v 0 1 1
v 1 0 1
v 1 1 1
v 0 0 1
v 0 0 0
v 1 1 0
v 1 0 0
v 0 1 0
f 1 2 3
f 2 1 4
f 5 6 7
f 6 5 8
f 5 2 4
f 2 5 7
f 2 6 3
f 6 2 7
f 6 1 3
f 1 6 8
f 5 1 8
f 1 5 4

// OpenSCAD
// Echoes the r5 paint-relevant dimensions so paint.py never hardcodes a number that common.scad
// already owns.  Driven by cad/tools/paint.py; runnable on its own for a quick look:
//   openscad -o /tmp/y.csg cad/tools/paint_probe.scad
include <../common.scad>

echo(P_W = R5_W);
echo(P_L = R5_L);
// the deck's plate is larger than the cassette (HOST_TOP / R5_DECK_* in common.scad): its own
// outline, centred on the cassette, in the cassette frame (so x0/y0 are negative)
echo(P_DECK_W = R5_DECK_W);
echo(P_DECK_L = R5_DECK_L);
echo(P_DECK_X0 = R5_DECK_X0);
echo(P_DECK_Y0 = R5_DECK_Y0);
echo(P_DECK_R = R5_DECK_R);
echo(P_DECK_T = R5_DECK_T);

echo(P_KB_X0 = R5_KB_X0);
echo(P_KB_Y0 = R5_KB_Y0);
echo(P_KB_W = R5_KB_POCKET[0]);
echo(P_KB_H = R5_KB_POCKET[1]);
echo(P_KB_R = R5_KB_CORNER + R5_KB_CLR);

echo(P_OLED_X0 = R5_OLED_WIN_X0);
echo(P_OLED_Y0 = R5_OLED_WIN_Y0);
echo(P_OLED_W = R5_OLED_WIN[0]);
echo(P_OLED_H = R5_OLED_WIN[1]);

echo(P_OPEN_X0 = R5_OPEN_X0);
echo(P_OPEN_X1 = R5_OPEN_X1);
echo(P_OPEN_D = R5_OPEN_D);

echo(P_FAN_X = DECK_FAN_CTRL[0][0]);
echo(P_FAN_Y = DECK_FAN_CTRL[0][1]);
echo(P_FAN_D = DECK_FAN_D);
echo(P_FAN_BARS = DECK_GRILL_BARS);
echo(P_FAN_BAR = DECK_GRILL_BAR);

echo(P_COVER_W = COVER_W);
echo(P_COVER_L = COVER_L);
echo(P_COVER_R = COVER_R);
echo(P_COVER_T = COVER_T);
echo(P_C_FRONT_Z = COVER_FRONT_Z);
echo(P_C_FRAME = COVER_FRAME);
echo(P_C_GAP = COVER_GAP);
echo(P_PANEL_X = PANEL_X);
echo(P_PANEL_Y = PANEL_Y);
echo(P_DISP_W = R5_PANEL[0]);
echo(P_DISP_H = R5_PANEL[1]);
echo(P_DISP_R = R5_PANEL[2]);
echo(P_ACTIVE_W = R5_PANEL_ACTIVE[0]);
echo(P_ACTIVE_H = R5_PANEL_ACTIVE[1]);
// the button is on the deck now, so it is a deck feature, not a cover one
echo(P_BTN_X = R5_BTN_X);
echo(P_BTN_Y = R5_BTN_Y);
echo(P_BTN_D = R5_BTN_D);
echo(P_BTN_BODY = R5_BTN_BODY);
// the 12 mm OLED button is a through-hole in the painted face too
echo(P_OBTN_X = R5_OLED_BTN_X);
echo(P_OBTN_Y = R5_OLED_BTN_Y);
echo(P_OBTN_D = R5_OLED_BTN_D);
echo(P_CHG_X = R5_CHG_X);
echo(P_CHG_Y = R5_CHG_Y);
echo(P_CHG_D = R5_CHG_D);
echo(P_CHG_NUT_D = R5_CHG_NUT_D);
// the DSI notch: from the cover's hinge edge to the panel, through bezel wall and plate. Its x is
// a cover coordinate, not a panel one: it lines up with the deck and tray openings, not the panel.
echo(P_CABLE_X = R5_CABLE_X0);
echo(P_CABLE_Y = 0);
echo(P_CABLE_W = R5_CABLE_W);
echo(P_CABLE_H = PANEL_Y - COVER_GAP);

echo(P_S0 = R5_SCREWS[0][0]); echo(P_S0Y = R5_SCREWS[0][1]);
echo(P_S1 = R5_SCREWS[1][0]); echo(P_S1Y = R5_SCREWS[1][1]);
echo(P_S2 = R5_SCREWS[2][0]); echo(P_S2Y = R5_SCREWS[2][1]);
echo(P_S3 = R5_SCREWS[3][0]); echo(P_S3Y = R5_SCREWS[3][1]);
echo(P_S4 = R5_SCREWS[4][0]); echo(P_S4Y = R5_SCREWS[4][1]);
echo(P_S5 = R5_SCREWS[5][0]); echo(P_S5Y = R5_SCREWS[5][1]);
echo(P_S6 = R5_SCREWS[6][0]); echo(P_S6Y = R5_SCREWS[6][1]);

cube(1);
